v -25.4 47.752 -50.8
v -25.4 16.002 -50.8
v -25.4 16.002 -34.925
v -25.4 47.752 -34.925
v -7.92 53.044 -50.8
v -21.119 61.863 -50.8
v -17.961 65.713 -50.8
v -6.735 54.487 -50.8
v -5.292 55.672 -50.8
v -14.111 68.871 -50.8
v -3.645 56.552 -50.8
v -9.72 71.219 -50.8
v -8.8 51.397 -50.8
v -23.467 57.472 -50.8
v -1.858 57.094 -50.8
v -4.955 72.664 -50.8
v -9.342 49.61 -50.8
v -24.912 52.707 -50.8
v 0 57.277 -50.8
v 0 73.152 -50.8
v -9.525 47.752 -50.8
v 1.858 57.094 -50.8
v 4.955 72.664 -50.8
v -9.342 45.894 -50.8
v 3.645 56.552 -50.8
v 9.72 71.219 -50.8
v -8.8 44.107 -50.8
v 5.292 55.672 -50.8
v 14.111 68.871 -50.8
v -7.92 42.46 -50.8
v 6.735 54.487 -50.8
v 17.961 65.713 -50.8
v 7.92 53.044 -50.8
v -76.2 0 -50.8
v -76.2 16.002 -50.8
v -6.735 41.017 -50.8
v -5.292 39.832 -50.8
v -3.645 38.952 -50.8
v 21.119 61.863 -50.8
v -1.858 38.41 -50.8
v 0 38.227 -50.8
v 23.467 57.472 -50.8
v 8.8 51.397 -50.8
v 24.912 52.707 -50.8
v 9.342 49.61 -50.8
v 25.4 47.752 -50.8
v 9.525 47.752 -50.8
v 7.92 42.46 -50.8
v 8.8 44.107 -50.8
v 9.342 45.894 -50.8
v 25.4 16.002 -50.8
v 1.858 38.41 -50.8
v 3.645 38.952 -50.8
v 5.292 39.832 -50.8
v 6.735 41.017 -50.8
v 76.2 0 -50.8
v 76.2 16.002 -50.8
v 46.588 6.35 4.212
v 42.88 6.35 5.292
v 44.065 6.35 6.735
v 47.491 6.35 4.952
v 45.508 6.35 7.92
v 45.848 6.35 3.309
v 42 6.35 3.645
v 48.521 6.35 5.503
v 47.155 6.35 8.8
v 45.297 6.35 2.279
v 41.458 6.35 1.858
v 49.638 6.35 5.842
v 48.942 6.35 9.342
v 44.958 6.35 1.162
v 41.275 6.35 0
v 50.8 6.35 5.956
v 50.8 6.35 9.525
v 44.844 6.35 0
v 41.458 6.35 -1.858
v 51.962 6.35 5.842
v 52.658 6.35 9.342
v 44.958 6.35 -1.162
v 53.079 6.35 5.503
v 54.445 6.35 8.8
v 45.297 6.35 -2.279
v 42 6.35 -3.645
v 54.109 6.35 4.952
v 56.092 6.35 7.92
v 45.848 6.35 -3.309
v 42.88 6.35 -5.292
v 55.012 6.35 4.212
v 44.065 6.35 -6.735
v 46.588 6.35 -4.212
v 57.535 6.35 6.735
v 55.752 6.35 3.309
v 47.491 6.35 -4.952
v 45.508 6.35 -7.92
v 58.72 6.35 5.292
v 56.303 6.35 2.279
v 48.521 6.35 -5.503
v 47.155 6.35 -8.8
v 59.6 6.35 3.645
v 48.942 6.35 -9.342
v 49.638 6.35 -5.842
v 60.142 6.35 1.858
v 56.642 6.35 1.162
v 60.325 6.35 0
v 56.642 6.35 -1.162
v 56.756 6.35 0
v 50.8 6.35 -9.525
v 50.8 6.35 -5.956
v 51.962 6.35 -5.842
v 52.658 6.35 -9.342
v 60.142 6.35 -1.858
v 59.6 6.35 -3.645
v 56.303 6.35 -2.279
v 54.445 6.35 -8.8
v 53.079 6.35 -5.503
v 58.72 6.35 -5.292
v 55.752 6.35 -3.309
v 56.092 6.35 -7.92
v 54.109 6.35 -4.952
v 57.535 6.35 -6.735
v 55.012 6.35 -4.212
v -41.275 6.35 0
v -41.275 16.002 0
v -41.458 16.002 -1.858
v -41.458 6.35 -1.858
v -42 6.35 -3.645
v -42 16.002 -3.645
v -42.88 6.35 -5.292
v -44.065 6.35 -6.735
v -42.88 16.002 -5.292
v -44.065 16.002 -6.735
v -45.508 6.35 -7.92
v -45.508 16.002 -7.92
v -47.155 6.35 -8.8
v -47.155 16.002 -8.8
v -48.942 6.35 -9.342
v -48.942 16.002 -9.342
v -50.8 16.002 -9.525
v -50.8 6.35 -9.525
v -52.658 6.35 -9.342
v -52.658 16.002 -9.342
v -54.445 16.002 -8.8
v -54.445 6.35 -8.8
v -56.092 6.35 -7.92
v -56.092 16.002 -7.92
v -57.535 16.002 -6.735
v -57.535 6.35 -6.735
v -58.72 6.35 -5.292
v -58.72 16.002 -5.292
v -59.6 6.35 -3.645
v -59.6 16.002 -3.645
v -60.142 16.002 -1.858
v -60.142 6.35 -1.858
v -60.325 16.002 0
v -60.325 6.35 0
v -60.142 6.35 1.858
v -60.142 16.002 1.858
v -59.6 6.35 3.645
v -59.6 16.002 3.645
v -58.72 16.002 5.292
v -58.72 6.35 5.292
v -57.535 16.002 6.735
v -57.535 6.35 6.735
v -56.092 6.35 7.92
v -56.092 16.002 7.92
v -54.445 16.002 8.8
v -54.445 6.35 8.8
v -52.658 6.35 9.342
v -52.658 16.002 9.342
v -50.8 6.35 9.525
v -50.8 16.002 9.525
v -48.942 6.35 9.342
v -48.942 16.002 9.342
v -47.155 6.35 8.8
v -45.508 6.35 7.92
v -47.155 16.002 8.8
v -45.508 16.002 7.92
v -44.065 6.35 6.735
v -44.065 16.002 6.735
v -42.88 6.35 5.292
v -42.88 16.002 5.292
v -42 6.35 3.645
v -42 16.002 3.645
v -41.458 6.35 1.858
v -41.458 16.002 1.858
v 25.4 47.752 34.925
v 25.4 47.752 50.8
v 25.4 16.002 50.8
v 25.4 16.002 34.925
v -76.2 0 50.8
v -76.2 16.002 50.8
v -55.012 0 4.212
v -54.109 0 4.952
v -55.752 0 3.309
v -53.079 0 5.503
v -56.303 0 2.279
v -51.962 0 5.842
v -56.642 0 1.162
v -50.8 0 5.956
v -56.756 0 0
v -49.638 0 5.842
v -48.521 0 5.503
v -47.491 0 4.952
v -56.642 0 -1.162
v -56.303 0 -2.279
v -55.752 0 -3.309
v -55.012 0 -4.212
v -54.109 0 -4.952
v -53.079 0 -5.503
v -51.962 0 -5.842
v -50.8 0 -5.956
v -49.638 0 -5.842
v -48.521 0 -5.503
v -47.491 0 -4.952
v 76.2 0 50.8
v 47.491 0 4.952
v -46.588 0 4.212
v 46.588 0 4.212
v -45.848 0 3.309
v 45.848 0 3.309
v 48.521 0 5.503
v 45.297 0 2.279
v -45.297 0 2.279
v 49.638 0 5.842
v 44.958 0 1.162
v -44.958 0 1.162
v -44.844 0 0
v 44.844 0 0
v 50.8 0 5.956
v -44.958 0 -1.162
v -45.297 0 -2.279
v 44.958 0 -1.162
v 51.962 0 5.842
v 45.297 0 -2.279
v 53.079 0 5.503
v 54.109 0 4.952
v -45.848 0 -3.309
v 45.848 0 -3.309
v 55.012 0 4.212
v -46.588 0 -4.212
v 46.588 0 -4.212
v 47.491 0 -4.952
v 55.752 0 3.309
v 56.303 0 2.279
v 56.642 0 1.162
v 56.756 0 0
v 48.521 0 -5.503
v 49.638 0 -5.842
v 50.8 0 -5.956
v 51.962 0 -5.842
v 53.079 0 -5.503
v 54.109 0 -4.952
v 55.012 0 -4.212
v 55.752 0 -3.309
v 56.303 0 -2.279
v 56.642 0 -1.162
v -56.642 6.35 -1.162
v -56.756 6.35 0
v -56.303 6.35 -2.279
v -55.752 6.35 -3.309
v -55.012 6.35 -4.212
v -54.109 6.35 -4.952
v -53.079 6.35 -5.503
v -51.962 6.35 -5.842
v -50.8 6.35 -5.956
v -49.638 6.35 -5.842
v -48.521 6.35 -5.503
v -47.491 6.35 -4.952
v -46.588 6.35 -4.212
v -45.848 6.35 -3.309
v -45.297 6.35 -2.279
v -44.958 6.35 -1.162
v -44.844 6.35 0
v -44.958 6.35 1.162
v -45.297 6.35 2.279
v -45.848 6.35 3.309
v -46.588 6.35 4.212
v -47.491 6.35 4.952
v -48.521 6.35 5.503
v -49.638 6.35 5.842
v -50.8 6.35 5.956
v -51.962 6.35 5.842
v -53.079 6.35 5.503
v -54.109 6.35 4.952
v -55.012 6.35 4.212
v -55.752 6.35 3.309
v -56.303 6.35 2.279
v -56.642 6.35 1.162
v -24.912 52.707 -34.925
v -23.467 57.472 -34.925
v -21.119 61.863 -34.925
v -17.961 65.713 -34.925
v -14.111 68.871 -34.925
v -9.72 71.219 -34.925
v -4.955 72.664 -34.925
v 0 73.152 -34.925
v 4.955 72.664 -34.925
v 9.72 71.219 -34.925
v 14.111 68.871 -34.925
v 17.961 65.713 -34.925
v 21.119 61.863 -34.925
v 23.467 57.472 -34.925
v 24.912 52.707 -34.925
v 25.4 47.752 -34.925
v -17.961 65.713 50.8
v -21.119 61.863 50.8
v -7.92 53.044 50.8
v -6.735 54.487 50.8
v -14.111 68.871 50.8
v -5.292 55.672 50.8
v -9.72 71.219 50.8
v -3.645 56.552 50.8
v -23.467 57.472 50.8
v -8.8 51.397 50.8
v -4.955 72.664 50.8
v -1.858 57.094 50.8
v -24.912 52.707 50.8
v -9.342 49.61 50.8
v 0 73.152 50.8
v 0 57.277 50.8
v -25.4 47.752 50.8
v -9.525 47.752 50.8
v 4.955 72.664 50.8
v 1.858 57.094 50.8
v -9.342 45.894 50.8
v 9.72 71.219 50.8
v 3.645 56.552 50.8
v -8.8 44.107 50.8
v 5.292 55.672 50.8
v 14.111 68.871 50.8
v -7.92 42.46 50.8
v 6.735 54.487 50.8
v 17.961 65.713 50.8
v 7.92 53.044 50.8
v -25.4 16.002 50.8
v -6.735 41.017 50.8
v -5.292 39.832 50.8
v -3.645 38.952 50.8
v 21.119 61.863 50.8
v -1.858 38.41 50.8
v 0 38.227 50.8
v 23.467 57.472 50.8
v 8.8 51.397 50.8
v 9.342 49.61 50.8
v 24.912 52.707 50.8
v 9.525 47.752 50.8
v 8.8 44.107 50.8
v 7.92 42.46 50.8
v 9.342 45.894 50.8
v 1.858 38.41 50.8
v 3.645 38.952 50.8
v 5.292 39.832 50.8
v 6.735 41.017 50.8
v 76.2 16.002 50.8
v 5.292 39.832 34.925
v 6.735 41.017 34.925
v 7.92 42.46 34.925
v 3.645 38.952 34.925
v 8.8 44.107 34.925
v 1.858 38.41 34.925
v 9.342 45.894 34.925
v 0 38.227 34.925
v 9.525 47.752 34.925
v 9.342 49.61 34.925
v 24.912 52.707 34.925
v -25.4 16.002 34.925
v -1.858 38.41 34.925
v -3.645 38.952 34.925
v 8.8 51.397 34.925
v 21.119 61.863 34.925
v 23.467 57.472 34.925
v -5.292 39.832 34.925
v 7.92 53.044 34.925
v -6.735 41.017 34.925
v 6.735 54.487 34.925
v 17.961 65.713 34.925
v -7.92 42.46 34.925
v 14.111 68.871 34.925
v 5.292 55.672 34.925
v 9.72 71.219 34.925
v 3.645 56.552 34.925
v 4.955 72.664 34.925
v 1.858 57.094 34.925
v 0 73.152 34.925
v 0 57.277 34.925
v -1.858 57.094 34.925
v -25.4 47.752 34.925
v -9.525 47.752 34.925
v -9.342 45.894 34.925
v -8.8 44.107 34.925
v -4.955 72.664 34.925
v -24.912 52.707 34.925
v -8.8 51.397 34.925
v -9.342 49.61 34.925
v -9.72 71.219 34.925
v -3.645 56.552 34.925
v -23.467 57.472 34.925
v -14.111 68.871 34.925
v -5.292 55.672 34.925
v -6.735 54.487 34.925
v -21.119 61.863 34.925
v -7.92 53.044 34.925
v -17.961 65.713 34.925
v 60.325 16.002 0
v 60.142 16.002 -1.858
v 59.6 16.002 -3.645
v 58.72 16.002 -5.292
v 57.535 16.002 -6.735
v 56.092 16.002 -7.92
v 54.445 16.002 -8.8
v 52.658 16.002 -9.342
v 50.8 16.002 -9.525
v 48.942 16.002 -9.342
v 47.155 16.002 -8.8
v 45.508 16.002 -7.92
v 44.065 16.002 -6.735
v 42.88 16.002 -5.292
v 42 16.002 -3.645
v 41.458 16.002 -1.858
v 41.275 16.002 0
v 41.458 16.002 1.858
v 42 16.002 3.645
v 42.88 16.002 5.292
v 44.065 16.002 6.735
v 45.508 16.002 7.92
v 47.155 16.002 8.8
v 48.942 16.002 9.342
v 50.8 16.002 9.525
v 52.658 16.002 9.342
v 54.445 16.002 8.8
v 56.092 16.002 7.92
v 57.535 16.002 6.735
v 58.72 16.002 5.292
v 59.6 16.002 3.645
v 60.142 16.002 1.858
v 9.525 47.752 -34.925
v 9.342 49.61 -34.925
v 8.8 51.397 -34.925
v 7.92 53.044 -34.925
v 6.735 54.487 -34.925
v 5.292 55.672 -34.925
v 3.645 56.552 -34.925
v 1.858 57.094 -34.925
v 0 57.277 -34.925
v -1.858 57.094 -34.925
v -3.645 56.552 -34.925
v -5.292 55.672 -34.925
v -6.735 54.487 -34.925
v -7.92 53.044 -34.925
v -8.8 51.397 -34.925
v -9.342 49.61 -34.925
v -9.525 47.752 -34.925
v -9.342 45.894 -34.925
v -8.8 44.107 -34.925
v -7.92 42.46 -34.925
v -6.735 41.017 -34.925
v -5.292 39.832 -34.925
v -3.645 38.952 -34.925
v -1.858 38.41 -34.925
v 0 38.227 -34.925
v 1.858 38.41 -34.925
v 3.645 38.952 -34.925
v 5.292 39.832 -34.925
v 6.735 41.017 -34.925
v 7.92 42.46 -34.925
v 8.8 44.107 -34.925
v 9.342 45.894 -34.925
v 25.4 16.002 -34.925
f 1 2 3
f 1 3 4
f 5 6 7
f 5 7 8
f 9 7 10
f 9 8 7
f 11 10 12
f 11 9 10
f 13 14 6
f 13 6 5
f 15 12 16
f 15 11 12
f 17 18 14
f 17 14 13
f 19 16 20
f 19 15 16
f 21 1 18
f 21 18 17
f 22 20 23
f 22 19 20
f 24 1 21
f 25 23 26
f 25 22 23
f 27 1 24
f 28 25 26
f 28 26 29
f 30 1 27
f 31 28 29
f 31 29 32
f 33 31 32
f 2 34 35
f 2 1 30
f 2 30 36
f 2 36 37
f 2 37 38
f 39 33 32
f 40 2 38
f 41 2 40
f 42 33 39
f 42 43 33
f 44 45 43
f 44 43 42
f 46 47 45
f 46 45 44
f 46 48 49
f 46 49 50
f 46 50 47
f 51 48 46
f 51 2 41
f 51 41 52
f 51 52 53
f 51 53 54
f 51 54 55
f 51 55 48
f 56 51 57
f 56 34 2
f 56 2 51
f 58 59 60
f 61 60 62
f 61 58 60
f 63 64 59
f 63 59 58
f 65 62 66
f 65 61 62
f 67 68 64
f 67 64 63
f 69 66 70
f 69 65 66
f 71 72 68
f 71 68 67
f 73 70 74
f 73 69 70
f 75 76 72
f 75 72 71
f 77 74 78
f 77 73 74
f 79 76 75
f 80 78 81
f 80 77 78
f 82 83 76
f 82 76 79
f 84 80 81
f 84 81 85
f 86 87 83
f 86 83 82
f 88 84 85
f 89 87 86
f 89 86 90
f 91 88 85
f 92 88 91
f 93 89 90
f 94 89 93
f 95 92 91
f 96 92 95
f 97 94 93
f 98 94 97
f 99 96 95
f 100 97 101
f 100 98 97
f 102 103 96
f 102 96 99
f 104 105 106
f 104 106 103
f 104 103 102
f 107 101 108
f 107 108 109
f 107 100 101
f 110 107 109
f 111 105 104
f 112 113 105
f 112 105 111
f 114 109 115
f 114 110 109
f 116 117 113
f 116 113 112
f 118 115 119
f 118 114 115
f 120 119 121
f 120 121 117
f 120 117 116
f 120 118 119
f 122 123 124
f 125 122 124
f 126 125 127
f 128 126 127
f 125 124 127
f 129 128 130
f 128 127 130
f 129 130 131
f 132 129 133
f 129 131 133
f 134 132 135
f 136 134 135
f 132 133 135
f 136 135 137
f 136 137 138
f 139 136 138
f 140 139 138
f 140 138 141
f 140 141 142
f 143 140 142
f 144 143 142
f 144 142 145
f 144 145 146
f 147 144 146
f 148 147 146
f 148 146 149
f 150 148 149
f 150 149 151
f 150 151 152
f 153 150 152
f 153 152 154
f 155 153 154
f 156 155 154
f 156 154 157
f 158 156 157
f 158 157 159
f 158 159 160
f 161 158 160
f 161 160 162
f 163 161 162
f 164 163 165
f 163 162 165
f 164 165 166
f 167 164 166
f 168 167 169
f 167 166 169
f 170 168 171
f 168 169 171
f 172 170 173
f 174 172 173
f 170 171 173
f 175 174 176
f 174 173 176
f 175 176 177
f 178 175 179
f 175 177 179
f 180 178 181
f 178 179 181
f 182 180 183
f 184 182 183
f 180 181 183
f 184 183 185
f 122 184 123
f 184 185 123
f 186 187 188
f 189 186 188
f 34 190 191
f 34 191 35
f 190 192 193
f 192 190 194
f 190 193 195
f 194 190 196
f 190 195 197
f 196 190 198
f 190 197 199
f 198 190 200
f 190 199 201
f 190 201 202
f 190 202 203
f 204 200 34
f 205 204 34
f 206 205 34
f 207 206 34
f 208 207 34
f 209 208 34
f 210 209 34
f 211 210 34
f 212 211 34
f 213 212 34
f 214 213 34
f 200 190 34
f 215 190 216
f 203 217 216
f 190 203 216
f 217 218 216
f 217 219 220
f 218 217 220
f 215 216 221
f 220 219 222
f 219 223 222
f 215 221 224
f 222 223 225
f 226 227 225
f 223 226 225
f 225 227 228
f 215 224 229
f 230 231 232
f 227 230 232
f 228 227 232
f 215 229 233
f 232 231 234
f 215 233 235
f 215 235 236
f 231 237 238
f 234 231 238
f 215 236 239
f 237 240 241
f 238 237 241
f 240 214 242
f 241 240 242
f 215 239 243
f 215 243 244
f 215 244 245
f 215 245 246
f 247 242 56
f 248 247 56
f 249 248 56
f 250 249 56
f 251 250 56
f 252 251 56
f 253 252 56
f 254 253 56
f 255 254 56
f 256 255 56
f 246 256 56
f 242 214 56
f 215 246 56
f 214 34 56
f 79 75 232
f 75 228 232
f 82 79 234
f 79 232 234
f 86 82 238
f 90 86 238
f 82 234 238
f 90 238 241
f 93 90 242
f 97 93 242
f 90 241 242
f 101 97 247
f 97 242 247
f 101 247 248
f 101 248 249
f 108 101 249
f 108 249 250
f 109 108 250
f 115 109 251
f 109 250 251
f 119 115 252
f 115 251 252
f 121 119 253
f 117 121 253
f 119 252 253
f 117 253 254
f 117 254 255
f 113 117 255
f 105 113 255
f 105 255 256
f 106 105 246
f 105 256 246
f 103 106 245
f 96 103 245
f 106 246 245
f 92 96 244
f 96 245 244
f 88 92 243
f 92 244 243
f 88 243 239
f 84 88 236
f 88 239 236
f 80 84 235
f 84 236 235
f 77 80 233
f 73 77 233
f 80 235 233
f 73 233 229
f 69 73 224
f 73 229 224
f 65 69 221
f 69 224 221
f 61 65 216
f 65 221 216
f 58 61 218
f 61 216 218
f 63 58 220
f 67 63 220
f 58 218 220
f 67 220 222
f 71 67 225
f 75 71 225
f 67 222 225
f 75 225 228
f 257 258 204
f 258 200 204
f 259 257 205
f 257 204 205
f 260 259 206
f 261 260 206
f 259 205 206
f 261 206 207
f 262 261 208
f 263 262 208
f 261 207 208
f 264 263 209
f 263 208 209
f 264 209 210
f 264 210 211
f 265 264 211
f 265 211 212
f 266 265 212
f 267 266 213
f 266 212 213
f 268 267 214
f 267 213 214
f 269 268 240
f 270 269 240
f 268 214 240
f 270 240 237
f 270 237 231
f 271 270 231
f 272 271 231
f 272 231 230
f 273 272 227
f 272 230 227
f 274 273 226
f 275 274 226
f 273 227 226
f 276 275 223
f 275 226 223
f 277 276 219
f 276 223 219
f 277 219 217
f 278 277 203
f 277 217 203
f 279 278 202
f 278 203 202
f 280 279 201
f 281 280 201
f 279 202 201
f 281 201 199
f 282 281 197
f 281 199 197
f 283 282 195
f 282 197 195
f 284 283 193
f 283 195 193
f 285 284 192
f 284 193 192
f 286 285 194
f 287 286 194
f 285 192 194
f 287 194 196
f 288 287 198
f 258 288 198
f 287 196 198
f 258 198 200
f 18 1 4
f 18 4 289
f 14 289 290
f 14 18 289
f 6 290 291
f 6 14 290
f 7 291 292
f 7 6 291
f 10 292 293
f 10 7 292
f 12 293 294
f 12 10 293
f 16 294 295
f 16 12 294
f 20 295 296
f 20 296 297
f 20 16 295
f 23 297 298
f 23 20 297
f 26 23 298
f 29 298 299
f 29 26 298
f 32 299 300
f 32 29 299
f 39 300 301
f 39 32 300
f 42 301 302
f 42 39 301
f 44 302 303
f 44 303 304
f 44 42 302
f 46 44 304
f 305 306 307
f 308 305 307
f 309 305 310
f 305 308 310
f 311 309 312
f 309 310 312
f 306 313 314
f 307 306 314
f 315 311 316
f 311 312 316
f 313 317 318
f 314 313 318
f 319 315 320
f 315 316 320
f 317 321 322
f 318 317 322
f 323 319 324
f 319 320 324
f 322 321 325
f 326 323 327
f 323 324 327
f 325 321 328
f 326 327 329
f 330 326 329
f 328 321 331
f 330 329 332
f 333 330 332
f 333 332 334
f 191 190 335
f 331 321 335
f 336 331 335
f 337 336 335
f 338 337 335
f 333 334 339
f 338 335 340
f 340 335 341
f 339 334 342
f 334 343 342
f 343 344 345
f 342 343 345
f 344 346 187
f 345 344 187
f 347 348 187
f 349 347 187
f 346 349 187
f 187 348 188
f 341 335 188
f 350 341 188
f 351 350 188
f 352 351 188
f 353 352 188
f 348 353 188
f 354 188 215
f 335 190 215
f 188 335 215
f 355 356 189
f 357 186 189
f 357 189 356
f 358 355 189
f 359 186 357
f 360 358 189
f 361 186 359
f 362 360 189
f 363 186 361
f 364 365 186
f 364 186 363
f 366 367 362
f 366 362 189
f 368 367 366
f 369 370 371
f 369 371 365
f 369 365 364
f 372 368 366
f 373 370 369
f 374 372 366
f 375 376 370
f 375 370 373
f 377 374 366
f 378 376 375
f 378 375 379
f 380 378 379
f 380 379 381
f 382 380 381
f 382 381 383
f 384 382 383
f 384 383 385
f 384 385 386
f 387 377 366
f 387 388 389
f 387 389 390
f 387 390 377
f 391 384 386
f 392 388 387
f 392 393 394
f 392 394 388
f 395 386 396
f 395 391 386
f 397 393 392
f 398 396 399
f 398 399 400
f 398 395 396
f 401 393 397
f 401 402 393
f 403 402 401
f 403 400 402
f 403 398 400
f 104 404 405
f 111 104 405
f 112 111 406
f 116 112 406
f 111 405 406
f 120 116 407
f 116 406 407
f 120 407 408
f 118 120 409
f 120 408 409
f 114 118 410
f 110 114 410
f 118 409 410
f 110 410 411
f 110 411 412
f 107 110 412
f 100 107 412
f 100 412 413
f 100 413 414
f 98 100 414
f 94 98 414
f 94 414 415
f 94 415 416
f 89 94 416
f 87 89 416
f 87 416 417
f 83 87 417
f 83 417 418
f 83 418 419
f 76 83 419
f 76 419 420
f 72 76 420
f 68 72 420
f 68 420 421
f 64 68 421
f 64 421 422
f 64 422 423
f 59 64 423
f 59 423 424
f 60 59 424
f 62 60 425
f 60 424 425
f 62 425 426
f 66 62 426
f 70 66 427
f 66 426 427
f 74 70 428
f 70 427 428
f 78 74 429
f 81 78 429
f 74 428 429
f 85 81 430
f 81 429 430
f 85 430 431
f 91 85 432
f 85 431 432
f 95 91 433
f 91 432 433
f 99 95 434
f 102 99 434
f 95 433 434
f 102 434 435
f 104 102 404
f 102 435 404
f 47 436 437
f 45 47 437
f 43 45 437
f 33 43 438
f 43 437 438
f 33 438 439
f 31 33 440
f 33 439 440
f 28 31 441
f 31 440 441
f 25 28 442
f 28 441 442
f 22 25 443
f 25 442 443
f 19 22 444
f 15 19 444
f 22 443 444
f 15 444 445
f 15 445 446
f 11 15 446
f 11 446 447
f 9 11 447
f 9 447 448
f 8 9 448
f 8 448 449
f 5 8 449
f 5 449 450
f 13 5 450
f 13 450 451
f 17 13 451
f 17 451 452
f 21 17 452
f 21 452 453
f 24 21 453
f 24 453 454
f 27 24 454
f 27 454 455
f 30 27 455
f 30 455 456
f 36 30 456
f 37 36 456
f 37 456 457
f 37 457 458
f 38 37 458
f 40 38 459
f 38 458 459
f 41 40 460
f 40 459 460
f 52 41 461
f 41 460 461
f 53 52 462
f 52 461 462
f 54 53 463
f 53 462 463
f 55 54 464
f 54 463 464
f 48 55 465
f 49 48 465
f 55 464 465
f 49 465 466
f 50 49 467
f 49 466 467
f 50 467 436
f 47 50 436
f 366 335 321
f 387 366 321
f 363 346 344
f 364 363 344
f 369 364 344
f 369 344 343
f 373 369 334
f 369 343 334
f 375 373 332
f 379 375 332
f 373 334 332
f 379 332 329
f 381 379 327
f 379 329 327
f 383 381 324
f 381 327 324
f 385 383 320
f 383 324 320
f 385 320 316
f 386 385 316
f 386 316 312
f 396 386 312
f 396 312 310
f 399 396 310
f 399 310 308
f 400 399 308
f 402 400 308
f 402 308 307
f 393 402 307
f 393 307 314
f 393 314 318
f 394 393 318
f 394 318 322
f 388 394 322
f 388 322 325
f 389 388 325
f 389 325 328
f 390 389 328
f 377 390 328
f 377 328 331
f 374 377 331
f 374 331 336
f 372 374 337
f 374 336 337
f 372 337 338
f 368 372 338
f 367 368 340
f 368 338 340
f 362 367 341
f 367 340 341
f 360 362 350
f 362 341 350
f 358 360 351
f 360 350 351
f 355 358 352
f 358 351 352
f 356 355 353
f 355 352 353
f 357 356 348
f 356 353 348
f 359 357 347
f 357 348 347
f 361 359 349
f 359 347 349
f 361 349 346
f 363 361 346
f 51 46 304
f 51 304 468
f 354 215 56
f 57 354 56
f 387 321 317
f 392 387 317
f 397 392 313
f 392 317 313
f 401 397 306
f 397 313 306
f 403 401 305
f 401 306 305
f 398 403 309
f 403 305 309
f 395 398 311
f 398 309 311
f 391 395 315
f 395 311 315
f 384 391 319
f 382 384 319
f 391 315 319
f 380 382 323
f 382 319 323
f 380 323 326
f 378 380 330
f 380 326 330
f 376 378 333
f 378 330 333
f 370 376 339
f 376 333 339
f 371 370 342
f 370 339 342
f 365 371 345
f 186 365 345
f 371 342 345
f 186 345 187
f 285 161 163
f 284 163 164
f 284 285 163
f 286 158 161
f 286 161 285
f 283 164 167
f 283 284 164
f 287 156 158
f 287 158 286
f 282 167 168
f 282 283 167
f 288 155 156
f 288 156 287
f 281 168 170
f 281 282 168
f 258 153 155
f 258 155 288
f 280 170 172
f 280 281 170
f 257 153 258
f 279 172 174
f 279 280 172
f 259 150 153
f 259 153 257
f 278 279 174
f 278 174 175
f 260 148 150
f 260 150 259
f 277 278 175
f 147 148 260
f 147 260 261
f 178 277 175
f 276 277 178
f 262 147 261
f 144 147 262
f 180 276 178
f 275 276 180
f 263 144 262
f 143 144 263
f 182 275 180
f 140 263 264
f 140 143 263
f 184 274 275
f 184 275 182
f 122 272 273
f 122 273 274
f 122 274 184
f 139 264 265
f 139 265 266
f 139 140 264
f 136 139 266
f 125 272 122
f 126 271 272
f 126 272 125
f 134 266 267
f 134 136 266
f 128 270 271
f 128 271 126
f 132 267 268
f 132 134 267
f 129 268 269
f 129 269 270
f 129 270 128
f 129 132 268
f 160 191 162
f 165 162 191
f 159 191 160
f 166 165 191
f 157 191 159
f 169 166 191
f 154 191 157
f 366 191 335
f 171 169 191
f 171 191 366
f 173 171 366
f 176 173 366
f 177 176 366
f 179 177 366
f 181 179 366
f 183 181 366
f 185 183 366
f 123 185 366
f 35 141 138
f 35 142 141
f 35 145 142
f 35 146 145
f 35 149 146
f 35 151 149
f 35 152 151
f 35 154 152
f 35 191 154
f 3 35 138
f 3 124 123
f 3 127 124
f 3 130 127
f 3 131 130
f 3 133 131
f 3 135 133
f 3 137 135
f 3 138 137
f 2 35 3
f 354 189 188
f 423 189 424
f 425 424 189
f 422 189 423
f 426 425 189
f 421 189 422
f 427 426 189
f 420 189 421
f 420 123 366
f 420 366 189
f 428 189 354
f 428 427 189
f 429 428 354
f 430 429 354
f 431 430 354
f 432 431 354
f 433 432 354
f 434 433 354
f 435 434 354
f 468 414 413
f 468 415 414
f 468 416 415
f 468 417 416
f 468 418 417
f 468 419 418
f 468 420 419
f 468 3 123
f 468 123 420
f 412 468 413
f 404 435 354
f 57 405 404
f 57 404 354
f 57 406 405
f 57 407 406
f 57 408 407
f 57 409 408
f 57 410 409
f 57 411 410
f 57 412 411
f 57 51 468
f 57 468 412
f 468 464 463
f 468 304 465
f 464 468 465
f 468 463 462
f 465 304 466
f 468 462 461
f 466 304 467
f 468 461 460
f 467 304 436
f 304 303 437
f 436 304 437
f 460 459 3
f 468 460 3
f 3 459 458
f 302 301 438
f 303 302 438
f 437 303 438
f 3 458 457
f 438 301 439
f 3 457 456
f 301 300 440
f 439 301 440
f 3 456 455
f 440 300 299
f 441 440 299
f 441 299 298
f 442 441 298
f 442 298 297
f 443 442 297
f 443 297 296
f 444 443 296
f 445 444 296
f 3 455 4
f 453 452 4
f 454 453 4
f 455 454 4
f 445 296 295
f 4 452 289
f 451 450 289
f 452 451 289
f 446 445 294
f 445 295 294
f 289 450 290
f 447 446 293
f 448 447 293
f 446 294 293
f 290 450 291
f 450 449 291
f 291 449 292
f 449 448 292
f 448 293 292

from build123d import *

# Parameters (mm, degrees)
SKETCH1_W                                           = 152.4
SKETCH1_H                                           = 101.6
BOSS_EXTRUDE1_DEPTH                                 = 16.002
CBORE_FOR_0_BINDING_HEAD_MACHINE_SCREW1_D           = 11.9126
CBORE_FOR_0_BINDING_HEAD_MACHINE_SCREW1_CBORE_D     = 19.05
CBORE_FOR_0_BINDING_HEAD_MACHINE_SCREW1_CBORE_DEPTH = 9.652
BOSS_EXTRUDE2_DEPTH                                 = 15.875
SKETCH8_R                                           = 9.525
CUT_EXTRUDE1_DEPTH                                  = 147.561301523


with BuildPart() as part:
    # Sketch1 → Boss-Extrude1 (new body)
    with BuildSketch(Plane(origin=(0, 0, 0), x_dir=(1, 0, 0), z_dir=(0, 1, 0))):
        Rectangle(SKETCH1_W, SKETCH1_H)
    extrude(amount=BOSS_EXTRUDE1_DEPTH)

    # CBORE for #0 Binding Head Machine Screw1 (through all)
    with Locations(Plane(origin=(0, 16.002, 0), x_dir=(1, 0, 0), z_dir=(0, 1, 0))):
        with Locations((-50.8, 0), (50.8, 0)):
            CounterBoreHole(CBORE_FOR_0_BINDING_HEAD_MACHINE_SCREW1_D / 2, CBORE_FOR_0_BINDING_HEAD_MACHINE_SCREW1_CBORE_D / 2, CBORE_FOR_0_BINDING_HEAD_MACHINE_SCREW1_CBORE_DEPTH)

    # Sketch7 → Boss-Extrude2 (add)
    with BuildSketch(Plane.XY.offset(50.8)):
        with BuildLine():
            Line((-25.4, 16.002), (-25.4, 47.752))
            ThreePointArc((-25.4, 47.752), (0, 73.152), (25.4, 47.752))
            Line((25.4, 47.752), (25.4, 16.002))
            Line((25.4, 16.002), (-25.4, 16.002))
        make_face()
    boss_extrude2 = extrude(amount=-BOSS_EXTRUDE2_DEPTH)

    # Mirror1: Boss-Extrude2 across plane
    add(boss_extrude2.mirror(Plane.XY))

    # Sketch8 → Cut-Extrude1 (cut, through all)
    with BuildSketch(Plane.XY.offset(50.8)):
        with Locations((0, 47.752)):
            Circle(SKETCH8_R)
    extrude(amount=-CUT_EXTRUDE1_DEPTH, mode=Mode.SUBTRACT)


solid = part.part
